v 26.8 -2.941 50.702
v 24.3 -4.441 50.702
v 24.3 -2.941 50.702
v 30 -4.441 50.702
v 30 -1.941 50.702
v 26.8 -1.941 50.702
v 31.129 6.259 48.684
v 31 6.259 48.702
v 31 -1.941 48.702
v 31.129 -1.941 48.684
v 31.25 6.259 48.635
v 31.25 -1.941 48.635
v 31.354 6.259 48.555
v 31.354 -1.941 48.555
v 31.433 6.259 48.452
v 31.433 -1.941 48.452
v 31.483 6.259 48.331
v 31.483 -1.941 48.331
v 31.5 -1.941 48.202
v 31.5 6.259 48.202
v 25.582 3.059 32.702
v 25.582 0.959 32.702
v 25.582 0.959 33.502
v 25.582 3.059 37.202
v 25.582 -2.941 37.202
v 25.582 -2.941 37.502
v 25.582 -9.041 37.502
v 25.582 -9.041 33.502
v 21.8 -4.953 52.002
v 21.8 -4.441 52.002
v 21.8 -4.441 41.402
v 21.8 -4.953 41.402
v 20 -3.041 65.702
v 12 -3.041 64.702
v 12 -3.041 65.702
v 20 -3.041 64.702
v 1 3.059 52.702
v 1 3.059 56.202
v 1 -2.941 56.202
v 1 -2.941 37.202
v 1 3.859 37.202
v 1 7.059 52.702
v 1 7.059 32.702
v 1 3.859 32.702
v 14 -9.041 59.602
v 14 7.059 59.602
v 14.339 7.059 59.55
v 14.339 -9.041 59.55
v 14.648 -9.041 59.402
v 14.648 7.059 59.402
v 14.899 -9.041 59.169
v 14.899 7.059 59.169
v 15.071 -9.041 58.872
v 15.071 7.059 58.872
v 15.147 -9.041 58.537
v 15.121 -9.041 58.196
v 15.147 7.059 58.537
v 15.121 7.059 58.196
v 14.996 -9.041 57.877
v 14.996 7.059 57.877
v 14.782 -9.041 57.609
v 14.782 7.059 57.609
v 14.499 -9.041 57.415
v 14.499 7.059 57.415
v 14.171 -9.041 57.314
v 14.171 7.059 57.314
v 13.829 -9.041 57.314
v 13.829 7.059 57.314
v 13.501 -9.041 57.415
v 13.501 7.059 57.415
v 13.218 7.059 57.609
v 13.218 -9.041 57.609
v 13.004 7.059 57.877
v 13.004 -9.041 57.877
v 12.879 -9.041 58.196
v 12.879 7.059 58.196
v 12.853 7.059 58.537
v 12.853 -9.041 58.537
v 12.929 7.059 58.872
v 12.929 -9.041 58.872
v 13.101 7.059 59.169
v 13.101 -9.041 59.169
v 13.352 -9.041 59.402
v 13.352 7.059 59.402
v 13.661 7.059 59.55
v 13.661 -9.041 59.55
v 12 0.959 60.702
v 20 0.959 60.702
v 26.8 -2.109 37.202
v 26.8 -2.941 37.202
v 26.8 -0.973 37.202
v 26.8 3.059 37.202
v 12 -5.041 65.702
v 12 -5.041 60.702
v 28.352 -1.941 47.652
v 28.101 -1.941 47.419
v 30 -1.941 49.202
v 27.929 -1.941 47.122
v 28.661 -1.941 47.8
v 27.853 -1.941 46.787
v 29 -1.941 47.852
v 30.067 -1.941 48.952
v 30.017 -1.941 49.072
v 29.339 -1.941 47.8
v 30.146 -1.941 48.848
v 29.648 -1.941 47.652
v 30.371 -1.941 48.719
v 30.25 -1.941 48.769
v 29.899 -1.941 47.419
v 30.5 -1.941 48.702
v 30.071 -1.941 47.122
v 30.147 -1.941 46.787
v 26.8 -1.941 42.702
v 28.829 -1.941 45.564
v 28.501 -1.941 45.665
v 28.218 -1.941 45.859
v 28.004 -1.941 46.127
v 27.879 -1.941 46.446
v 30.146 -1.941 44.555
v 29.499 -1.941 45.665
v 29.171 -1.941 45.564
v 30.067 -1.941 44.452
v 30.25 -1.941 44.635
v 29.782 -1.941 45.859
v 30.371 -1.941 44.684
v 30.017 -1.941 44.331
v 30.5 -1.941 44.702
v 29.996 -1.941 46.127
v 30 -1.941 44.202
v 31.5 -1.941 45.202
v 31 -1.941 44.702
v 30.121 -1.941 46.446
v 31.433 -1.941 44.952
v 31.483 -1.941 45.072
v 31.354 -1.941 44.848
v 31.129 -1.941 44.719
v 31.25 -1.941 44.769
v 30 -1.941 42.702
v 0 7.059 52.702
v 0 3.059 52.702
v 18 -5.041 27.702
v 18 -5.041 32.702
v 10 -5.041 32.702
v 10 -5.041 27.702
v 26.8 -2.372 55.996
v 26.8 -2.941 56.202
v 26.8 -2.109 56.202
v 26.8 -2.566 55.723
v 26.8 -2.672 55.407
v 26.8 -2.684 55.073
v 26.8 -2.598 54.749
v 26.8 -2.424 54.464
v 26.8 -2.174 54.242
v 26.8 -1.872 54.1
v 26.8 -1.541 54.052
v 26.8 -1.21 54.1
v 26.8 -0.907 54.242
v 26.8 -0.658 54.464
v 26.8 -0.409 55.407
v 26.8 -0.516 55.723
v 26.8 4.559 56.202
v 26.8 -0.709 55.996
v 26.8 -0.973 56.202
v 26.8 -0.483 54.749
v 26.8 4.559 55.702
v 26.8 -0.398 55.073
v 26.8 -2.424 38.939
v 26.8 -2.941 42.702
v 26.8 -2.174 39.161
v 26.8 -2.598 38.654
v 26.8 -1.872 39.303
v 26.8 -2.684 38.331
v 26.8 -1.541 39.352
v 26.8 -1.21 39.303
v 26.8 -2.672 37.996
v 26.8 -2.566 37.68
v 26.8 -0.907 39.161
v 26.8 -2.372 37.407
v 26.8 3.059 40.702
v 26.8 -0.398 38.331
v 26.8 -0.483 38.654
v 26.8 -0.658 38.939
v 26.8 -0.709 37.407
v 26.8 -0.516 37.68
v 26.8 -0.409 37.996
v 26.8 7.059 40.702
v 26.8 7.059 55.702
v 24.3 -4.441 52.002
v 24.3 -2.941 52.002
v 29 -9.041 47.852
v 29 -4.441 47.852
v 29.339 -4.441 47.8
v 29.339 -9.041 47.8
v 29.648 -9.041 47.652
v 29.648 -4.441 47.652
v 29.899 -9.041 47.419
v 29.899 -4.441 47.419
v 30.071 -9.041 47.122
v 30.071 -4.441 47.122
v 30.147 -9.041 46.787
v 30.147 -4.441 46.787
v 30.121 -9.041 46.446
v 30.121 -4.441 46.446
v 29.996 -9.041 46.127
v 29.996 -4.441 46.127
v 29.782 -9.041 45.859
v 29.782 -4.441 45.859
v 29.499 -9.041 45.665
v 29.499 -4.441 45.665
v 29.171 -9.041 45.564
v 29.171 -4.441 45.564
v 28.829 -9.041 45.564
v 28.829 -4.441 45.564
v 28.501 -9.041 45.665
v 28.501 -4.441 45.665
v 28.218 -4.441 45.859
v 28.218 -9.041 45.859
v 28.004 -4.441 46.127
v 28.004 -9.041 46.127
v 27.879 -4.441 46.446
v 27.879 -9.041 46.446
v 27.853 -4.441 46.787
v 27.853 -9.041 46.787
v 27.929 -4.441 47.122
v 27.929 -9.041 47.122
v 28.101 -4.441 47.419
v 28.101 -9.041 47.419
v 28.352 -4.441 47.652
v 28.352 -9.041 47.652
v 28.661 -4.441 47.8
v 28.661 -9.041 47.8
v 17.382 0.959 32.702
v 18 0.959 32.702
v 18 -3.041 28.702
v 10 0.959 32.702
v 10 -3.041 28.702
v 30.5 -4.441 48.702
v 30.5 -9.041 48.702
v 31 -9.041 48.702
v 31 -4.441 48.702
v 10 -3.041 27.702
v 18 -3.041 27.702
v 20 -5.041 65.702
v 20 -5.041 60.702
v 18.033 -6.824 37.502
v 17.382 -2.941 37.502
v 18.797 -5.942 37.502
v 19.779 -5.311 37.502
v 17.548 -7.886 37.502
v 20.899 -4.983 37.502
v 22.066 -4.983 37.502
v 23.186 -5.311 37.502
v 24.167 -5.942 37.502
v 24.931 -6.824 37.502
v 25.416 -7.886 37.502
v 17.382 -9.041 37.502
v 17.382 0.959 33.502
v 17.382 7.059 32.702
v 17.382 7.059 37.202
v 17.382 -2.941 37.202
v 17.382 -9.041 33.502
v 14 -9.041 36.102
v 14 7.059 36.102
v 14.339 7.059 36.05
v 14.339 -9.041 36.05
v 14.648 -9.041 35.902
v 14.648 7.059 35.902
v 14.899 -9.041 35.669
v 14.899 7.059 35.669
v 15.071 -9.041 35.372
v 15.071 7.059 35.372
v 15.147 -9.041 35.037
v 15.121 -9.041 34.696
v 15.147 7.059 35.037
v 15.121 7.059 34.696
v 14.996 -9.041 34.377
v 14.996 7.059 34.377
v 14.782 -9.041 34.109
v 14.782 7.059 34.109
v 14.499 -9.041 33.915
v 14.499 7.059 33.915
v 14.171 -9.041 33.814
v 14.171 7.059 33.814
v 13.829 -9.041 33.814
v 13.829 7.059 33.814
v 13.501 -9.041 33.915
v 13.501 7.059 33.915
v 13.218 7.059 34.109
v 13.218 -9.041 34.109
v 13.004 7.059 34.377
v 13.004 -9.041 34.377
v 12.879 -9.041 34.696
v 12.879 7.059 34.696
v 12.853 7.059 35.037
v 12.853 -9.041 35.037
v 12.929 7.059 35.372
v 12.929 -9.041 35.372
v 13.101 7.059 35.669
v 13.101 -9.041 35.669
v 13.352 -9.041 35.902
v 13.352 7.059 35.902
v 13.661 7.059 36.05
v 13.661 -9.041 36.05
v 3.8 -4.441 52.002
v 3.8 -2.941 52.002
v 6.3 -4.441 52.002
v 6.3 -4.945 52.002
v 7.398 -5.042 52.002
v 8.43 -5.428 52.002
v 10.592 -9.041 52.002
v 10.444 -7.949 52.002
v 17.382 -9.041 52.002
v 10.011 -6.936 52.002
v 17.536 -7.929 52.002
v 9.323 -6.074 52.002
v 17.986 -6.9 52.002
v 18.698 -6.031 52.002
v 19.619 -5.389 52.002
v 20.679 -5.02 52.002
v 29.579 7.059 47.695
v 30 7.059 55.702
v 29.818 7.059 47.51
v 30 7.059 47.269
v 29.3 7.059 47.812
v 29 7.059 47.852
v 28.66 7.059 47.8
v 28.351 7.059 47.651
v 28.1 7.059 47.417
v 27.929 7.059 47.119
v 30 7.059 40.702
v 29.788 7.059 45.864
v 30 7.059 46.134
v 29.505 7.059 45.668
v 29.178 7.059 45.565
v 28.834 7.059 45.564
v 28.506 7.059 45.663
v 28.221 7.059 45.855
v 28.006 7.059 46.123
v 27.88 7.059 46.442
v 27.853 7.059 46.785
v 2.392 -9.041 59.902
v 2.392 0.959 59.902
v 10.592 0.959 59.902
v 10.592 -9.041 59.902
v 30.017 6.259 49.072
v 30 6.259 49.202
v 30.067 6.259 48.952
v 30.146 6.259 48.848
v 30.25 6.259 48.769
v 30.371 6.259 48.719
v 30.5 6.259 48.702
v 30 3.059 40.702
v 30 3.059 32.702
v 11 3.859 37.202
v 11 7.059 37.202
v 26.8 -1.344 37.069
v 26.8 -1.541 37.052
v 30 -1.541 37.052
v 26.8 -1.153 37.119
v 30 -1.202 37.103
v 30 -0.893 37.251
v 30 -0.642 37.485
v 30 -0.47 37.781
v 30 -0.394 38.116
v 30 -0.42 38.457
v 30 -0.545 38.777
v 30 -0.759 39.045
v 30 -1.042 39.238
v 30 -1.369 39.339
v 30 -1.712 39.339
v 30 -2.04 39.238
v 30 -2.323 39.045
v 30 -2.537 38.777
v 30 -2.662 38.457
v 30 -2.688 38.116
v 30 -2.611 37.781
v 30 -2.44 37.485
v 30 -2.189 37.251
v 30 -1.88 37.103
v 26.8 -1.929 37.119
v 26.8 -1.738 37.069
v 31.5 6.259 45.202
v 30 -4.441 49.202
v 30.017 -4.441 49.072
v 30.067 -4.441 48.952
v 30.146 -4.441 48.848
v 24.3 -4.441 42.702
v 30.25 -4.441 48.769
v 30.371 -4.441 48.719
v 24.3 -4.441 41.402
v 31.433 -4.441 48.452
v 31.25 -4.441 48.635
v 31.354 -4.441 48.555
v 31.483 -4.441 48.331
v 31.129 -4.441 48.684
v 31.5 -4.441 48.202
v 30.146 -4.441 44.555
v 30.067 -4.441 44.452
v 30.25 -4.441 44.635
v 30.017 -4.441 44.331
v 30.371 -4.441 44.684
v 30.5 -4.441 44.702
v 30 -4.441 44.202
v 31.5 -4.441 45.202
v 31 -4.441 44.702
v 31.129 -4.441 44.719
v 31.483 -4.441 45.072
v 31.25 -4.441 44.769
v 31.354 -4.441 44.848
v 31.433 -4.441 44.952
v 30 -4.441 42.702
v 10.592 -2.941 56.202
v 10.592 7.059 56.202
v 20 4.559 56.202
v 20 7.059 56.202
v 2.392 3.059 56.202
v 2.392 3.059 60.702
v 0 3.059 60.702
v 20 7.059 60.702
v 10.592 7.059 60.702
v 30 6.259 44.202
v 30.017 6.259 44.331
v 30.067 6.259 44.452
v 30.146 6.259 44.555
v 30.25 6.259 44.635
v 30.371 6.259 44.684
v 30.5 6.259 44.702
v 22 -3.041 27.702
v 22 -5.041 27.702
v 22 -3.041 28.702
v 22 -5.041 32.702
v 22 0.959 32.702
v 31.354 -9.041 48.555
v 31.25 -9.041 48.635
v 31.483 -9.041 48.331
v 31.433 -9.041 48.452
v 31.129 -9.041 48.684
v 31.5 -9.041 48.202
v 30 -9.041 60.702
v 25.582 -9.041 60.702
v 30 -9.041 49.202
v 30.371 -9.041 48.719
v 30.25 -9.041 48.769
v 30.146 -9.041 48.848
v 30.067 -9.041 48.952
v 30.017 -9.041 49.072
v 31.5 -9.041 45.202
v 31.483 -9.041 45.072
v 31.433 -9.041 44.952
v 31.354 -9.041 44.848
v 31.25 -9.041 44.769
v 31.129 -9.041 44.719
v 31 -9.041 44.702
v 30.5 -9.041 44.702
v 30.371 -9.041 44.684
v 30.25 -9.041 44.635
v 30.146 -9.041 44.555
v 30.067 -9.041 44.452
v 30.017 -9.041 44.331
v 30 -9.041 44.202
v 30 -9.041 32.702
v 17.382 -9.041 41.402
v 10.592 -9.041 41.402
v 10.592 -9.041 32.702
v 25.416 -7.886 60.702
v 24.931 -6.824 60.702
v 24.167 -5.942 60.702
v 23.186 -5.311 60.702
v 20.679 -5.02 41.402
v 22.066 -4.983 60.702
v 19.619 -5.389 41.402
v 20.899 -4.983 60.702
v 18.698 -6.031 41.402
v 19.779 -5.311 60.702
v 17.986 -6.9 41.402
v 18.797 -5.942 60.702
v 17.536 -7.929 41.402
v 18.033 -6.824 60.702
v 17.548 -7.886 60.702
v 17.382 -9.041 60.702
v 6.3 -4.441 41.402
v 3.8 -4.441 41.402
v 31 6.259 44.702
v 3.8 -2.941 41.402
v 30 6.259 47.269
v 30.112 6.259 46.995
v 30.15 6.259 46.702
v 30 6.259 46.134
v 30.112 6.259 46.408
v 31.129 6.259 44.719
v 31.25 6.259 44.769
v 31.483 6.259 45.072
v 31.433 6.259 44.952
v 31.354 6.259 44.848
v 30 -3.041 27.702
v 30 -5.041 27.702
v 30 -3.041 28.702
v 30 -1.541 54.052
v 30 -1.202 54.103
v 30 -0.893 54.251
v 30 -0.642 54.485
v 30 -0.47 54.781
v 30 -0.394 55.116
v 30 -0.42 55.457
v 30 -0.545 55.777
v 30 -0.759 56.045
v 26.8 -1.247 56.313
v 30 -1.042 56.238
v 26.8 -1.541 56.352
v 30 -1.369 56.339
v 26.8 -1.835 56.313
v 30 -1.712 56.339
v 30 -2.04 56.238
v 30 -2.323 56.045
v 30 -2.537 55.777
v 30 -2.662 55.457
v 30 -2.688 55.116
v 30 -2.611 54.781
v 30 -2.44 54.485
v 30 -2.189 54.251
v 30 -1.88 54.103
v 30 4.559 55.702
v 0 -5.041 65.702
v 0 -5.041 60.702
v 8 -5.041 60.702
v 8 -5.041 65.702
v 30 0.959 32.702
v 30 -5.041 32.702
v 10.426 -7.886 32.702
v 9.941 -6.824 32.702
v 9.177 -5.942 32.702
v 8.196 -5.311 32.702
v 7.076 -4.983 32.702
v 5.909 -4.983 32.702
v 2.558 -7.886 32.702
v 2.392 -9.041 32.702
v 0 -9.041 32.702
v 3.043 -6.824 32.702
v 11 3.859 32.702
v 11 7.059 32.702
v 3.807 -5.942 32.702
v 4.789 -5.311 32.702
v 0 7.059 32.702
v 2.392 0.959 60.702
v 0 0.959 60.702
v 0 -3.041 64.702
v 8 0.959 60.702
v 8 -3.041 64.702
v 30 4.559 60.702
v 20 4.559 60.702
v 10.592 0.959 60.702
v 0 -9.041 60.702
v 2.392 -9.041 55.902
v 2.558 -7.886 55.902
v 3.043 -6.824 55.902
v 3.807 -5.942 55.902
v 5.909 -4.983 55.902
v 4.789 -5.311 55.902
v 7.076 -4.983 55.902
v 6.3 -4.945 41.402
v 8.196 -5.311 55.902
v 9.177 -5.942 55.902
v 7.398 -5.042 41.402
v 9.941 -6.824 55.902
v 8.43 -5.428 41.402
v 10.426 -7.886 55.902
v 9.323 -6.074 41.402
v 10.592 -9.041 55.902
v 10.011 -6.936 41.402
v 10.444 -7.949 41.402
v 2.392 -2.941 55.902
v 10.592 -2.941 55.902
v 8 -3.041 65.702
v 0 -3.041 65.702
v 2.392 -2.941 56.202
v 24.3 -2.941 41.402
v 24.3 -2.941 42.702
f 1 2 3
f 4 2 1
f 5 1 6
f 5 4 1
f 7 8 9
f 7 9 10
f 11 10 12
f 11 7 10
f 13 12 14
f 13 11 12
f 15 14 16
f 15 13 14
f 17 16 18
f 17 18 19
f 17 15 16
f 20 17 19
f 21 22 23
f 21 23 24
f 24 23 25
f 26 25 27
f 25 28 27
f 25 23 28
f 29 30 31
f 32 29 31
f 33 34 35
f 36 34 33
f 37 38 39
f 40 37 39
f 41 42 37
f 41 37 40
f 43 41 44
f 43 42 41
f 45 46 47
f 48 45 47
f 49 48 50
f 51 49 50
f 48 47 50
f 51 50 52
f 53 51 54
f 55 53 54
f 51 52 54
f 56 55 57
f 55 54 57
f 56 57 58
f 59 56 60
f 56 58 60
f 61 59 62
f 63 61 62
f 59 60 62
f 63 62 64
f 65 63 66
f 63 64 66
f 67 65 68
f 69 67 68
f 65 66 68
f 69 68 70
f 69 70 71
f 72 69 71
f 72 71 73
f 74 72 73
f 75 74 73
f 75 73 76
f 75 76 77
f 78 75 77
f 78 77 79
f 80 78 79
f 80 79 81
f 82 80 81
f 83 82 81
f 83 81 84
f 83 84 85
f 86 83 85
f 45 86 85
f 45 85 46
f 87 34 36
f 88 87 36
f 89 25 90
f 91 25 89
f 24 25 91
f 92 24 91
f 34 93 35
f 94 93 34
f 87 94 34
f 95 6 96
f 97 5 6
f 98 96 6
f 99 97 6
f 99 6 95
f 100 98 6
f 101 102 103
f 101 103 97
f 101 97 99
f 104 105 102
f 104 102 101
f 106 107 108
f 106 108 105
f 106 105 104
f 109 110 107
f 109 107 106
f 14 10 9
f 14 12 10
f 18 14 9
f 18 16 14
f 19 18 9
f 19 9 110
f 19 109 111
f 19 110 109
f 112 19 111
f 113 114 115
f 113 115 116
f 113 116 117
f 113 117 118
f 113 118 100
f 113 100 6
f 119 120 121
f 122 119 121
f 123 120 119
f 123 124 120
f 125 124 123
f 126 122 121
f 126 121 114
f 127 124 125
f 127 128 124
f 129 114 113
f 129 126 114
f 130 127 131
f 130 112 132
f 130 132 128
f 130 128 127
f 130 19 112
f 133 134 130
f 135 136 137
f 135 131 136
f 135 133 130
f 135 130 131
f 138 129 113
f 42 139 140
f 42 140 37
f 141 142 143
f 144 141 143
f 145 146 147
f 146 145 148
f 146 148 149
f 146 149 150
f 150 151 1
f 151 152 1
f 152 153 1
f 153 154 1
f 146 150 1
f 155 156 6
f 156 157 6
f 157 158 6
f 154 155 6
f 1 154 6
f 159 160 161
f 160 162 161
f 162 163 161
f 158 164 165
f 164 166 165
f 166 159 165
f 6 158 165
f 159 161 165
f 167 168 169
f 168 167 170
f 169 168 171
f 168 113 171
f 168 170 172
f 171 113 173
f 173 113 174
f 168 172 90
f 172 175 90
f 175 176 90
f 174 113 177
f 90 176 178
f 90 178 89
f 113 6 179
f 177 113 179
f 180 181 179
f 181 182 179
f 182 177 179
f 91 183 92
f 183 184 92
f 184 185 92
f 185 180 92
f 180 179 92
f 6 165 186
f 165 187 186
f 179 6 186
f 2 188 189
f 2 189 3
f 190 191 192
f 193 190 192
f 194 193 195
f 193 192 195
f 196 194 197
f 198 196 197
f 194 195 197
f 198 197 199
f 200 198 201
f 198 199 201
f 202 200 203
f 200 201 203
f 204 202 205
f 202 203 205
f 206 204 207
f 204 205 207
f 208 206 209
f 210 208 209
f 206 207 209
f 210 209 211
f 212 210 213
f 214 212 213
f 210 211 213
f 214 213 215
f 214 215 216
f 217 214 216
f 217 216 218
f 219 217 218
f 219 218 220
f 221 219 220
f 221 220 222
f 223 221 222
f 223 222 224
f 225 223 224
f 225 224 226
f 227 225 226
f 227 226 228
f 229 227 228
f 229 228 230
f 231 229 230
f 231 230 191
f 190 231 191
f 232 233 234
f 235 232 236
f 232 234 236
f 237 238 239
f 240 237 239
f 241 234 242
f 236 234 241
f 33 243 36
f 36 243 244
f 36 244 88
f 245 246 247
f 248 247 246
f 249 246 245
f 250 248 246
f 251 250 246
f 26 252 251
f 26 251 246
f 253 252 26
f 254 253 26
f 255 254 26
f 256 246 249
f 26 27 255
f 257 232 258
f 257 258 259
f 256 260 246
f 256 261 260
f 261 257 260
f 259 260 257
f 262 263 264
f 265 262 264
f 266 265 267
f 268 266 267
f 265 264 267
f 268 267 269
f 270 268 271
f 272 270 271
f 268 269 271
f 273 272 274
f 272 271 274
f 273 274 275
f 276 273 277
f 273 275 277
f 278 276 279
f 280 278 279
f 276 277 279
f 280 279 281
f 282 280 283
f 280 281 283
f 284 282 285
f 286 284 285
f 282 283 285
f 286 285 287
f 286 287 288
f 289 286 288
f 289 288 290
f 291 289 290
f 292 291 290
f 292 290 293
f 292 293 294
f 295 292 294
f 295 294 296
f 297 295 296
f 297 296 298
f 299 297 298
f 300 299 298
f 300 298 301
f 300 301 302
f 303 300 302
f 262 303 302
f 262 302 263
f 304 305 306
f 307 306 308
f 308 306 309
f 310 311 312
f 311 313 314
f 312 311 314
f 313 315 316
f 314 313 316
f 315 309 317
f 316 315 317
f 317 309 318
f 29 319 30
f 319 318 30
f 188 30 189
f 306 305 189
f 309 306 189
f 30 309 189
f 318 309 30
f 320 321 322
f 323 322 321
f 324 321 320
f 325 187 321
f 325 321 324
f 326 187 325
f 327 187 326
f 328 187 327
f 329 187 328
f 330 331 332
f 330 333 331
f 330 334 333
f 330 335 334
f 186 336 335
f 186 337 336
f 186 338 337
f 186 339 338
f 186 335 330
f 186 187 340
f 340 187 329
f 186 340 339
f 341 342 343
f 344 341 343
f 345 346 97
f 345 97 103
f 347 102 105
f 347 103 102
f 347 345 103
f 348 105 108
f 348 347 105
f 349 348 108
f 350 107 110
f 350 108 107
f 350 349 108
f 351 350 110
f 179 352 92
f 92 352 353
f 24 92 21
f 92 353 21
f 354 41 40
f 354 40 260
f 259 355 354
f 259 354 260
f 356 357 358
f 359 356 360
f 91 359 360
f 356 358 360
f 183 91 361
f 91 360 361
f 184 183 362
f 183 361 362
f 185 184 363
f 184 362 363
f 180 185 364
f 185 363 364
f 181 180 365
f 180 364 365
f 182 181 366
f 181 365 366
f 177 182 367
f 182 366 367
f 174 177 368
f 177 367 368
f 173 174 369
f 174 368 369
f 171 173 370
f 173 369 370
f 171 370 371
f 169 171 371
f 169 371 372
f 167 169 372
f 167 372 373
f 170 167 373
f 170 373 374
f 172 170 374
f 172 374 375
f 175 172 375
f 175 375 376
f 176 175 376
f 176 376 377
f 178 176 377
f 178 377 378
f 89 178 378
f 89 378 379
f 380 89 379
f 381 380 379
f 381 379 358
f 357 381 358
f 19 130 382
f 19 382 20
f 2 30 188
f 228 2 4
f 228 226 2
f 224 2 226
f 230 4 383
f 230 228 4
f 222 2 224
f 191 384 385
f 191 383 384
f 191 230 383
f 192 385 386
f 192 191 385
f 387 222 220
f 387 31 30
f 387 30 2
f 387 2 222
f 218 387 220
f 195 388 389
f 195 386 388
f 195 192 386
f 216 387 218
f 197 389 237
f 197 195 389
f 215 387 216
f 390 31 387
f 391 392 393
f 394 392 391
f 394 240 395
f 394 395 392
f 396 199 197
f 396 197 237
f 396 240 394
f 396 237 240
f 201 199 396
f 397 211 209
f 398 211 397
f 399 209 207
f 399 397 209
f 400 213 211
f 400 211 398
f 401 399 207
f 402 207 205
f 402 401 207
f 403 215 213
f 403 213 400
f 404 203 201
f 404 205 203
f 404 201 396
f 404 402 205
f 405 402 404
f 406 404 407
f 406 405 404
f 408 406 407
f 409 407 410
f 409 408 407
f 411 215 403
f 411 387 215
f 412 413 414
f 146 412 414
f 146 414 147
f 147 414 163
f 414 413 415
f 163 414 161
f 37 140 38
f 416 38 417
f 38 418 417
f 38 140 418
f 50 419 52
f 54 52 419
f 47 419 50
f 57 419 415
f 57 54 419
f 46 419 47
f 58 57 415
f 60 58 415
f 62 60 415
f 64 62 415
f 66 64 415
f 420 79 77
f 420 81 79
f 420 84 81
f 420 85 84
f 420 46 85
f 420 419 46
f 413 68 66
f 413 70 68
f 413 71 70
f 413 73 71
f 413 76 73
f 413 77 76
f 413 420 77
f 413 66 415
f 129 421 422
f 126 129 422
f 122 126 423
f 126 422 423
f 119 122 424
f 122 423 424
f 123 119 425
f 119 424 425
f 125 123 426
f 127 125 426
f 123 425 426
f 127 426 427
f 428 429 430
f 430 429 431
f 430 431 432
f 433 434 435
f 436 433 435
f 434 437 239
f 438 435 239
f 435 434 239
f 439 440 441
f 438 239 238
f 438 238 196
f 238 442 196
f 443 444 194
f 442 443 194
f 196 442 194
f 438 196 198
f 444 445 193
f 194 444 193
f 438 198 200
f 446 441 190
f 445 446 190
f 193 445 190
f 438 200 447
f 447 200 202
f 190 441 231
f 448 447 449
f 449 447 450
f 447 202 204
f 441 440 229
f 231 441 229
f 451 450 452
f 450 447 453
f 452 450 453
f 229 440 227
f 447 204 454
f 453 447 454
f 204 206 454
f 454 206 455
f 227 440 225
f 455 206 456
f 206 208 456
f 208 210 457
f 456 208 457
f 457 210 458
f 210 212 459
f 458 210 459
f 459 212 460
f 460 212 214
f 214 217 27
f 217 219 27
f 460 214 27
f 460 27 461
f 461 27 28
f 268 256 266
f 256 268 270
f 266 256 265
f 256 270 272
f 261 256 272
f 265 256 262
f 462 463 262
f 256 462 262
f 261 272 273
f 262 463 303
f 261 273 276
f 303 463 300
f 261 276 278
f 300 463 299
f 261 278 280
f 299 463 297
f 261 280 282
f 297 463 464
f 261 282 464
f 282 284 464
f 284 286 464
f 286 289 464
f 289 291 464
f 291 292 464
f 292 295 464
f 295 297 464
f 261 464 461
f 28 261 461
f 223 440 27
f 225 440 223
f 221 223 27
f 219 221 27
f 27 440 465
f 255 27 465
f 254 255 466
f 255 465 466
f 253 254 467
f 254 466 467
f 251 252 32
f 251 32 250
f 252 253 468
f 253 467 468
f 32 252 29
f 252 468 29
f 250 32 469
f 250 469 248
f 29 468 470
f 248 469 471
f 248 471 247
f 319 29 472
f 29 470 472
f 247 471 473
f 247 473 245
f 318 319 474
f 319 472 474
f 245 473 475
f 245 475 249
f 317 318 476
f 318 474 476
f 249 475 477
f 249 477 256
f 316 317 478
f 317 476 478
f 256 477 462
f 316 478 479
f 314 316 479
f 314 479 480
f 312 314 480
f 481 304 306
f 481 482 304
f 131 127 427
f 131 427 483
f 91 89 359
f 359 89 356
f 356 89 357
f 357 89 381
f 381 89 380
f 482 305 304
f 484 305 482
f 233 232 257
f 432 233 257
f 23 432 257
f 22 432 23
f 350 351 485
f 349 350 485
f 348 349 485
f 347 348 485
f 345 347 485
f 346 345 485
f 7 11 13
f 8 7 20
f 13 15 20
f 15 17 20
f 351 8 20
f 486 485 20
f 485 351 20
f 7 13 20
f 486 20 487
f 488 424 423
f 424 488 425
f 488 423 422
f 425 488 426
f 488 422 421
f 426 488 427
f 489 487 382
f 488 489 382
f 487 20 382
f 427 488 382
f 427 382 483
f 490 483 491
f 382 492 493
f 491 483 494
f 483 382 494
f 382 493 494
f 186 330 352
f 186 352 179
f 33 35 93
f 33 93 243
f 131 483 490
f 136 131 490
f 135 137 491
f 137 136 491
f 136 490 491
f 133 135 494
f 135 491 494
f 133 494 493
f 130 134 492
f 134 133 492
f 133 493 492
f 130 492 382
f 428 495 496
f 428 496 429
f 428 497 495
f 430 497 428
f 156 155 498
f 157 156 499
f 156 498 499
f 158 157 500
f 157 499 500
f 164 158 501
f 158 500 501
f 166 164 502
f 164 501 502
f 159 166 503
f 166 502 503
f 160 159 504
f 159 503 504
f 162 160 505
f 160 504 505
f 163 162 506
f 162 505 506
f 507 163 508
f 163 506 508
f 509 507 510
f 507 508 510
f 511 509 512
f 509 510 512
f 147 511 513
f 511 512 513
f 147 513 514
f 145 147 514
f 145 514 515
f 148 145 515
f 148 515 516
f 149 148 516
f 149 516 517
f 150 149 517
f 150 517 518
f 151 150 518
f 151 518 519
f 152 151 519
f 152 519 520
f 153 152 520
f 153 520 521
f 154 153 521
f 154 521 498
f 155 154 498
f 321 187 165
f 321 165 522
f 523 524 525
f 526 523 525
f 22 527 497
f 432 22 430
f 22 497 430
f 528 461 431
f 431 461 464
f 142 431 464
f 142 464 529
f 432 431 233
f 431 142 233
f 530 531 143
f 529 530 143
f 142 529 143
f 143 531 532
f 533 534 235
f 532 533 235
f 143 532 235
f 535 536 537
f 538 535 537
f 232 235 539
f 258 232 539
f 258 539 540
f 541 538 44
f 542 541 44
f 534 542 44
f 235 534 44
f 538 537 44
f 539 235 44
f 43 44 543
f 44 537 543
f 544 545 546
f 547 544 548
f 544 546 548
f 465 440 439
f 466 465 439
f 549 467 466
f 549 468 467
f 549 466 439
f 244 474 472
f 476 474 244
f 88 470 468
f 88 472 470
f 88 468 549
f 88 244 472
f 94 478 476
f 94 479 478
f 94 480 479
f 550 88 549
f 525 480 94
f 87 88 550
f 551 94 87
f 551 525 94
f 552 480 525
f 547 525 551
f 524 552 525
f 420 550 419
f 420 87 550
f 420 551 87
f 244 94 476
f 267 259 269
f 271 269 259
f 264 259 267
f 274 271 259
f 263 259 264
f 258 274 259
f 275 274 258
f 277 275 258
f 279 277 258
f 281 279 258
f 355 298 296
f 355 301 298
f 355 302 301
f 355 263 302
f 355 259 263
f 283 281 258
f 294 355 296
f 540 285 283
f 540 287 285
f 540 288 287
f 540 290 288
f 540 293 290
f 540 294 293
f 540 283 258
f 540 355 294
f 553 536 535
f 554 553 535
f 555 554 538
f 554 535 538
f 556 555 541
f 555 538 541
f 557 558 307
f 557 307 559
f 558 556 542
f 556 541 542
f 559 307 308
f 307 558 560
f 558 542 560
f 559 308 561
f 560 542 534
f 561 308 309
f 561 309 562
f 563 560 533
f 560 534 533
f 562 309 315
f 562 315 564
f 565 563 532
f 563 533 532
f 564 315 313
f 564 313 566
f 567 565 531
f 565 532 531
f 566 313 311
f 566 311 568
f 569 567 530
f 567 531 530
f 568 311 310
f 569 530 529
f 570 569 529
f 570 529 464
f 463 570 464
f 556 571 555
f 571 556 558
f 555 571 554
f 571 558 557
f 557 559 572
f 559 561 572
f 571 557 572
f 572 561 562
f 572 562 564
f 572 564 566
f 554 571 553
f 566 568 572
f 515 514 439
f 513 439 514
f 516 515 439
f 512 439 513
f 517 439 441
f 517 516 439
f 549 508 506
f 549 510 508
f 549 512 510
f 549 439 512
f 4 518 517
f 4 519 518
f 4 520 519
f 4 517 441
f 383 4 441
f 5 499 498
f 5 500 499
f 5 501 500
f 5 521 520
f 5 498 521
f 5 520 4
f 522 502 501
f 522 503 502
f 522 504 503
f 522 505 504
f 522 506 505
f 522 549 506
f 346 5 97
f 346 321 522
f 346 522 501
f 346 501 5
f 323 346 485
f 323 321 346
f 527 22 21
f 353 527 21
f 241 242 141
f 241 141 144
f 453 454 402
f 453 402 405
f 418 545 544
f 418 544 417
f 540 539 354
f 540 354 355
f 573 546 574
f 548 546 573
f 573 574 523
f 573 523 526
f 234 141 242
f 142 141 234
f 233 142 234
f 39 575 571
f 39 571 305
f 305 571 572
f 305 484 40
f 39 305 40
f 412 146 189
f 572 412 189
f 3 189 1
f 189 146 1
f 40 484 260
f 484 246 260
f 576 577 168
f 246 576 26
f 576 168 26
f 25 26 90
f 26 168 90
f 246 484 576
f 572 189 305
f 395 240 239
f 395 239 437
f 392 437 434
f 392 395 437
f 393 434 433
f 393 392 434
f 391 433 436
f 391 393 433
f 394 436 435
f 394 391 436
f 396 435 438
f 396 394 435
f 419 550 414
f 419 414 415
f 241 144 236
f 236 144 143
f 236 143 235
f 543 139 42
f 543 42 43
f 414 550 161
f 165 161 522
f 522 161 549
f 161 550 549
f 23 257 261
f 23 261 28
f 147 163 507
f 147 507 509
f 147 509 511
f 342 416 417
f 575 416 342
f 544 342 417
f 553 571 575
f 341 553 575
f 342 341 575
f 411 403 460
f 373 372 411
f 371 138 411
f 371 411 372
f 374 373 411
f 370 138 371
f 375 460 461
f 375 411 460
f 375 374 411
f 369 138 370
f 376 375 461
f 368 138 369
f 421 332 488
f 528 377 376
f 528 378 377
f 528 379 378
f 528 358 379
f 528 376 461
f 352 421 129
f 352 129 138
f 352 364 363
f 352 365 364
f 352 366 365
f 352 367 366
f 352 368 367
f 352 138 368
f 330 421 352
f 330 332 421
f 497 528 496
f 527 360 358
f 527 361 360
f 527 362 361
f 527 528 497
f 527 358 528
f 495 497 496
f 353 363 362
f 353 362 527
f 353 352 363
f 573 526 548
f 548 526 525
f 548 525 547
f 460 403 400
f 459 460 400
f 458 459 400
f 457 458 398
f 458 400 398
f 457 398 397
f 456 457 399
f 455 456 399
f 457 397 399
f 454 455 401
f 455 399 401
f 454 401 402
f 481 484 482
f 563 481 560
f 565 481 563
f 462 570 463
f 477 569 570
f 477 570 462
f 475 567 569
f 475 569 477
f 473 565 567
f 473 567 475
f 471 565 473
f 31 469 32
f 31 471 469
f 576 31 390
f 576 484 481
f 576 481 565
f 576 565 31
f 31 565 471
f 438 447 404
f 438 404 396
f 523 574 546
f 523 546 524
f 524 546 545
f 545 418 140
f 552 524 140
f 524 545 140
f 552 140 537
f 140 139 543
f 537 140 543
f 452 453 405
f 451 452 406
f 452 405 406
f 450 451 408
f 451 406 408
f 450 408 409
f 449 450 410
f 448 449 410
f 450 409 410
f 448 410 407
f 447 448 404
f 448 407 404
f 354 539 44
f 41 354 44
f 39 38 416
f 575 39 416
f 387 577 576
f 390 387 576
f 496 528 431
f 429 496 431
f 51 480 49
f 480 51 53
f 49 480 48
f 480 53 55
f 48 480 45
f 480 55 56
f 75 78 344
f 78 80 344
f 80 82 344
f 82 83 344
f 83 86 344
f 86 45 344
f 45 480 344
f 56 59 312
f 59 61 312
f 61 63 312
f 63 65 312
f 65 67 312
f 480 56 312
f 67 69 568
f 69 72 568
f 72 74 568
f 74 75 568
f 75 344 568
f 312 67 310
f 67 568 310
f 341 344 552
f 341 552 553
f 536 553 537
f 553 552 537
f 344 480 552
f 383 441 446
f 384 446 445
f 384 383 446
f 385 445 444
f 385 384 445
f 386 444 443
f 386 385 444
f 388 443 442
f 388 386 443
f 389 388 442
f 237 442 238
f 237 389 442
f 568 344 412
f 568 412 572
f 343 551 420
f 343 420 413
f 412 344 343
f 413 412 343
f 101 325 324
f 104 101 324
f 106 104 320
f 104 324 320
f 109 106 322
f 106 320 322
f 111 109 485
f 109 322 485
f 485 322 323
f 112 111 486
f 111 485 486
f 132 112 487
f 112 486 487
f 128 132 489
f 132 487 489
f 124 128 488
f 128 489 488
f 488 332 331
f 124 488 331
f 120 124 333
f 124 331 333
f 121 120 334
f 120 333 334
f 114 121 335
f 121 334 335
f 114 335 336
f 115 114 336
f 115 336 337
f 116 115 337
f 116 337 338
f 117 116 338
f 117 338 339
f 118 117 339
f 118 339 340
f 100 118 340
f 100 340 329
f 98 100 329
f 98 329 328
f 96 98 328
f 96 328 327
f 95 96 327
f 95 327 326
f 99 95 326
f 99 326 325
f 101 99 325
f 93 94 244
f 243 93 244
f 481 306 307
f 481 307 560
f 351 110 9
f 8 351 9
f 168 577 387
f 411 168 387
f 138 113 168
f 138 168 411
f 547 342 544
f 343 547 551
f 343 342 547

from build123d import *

# Parameters (mm, degrees)
SKETCH1_W           = 28
SKETCH1_H           = 16.1
BOSS_EXTRUDE1_DEPTH = 30
SKETCH2_W           = 10
SKETCH2_H           = 2.5
CUT_EXTRUDE1_DEPTH  = 5
SKETCH3_W           = 10
SKETCH3_H           = 4
CUT_EXTRUDE2_DEPTH  = 8
SKETCH4_W           = 10
SKETCH4_H           = 3.2
CUT_EXTRUDE3_DEPTH  = 8
SKETCH5_W           = 11
SKETCH5_H           = 4
CUT_EXTRUDE4_DEPTH  = 8
SKETCH6_W           = 20
SKETCH6_H           = 2
BOSS_EXTRUDE2_DEPTH = 5
CHAMFER1_SIZE       = 4
SKETCH7_W           = 20
SKETCH7_H           = 2
BOSS_EXTRUDE3_DEPTH = 5
CHAMFER2_SIZE       = 4
SKETCH9_W           = 25.8
SKETCH9_H           = 19
CUT_EXTRUDE6_DEPTH  = 10
SKETCH13_R          = 4.1
CUT_EXTRUDE10_DEPTH = 27.2
SKETCH14_R          = 4.1
CUT_EXTRUDE11_DEPTH = 27.2
SKETCH15_W          = 8.2
SKETCH15_H          = 4
CUT_EXTRUDE12_DEPTH = 27.2
SKETCH16_W          = 0.59230819
SKETCH16_H          = 0.8
SKETCH16_W_2        = 1.617695922
CUT_EXTRUDE13_DEPTH = 4
SKETCH17_W          = 1.5
SKETCH17_H          = 4
BOSS_EXTRUDE4_DEPTH = 16.1
FILLET1_R           = 0.5
SKETCH18_R          = 3.5
CUT_EXTRUDE14_DEPTH = 6.1
SKETCH19_W          = 8
SKETCH19_H          = 1
CUT_EXTRUDE15_DEPTH = 10
SKETCH20_W          = 20.5
SKETCH20_H          = 10.6
CUT_EXTRUDE16_DEPTH = 1.5
SKETCH21_W          = 5.7
SKETCH21_H          = 8
CUT_EXTRUDE17_DEPTH = 1.5
SKETCH22_W          = 8
SKETCH22_H          = 2.5
CUT_EXTRUDE18_DEPTH = 1.5
SKETCH23_R          = 1.15
CUT_EXTRUDE19_DEPTH = 75.620049118
SKETCH24_W          = 8.2
SKETCH24_H          = 0.8
CUT_EXTRUDE20_DEPTH = 2.1
CUT_EXTRUDE21_REACH = 75.421
SKETCH25_W          = 7.929527271
SKETCH25_H          = 0.8
CUT_EXTRUDE22_START = -5
SKETCH26_W          = 4
SKETCH26_H          = 6
CUT_EXTRUDE22_DEPTH = 5
CUT_EXTRUDE23_START = -5
SKETCH27_W          = 4
SKETCH27_H          = 6
CUT_EXTRUDE23_DEPTH = 5
SKETCH28_R          = 1.15
CUT_EXTRUDE24_DEPTH = 3.2
CUT_EXTRUDE25_REACH = 75.764
SKETCH29_W          = 15.5
SKETCH29_H          = 10.6


with BuildPart() as part:
    # Sketch1 → Boss-Extrude1 (new body)
    with BuildSketch(Plane(origin=(0, 0, 0), x_dir=(0, 0, -1), z_dir=(1, 0, 0))):
        with Locations((-46.701535197, -0.990821865)):
            Rectangle(SKETCH1_W, SKETCH1_H)
    extrude(amount=BOSS_EXTRUDE1_DEPTH)

    # Sketch2 → Cut-Extrude1 (cut)
    with BuildSketch(Plane.XY.offset(60.701535197)):
        with Locations((25, 5.809178135)):
            Rectangle(SKETCH2_W, SKETCH2_H)
    extrude(amount=-CUT_EXTRUDE1_DEPTH, mode=Mode.SUBTRACT)

    # Sketch3 → Cut-Extrude2 (cut)
    with BuildSketch(Plane.XY.offset(60.701535197)):
        with Locations((5, 5.059178135)):
            Rectangle(SKETCH3_W, SKETCH3_H)
    extrude(amount=-CUT_EXTRUDE2_DEPTH, mode=Mode.SUBTRACT)

    # Sketch4 → Cut-Extrude3 (cut)
    with BuildSketch(Plane(origin=(0, 0, 32.701535197), x_dir=(-1, 0, 0), z_dir=(0, 0, -1))):
        with Locations((-6, 5.459178135)):
            Rectangle(SKETCH4_W, SKETCH4_H)
    extrude(amount=-CUT_EXTRUDE3_DEPTH, mode=Mode.SUBTRACT)

    # Sketch5 → Cut-Extrude4 (cut)
    with BuildSketch(Plane(origin=(0, 0, 32.701535197), x_dir=(-1, 0, 0), z_dir=(0, 0, -1))):
        with Locations((-24.5, 5.059178135)):
            Rectangle(SKETCH5_W, SKETCH5_H)
    extrude(amount=-CUT_EXTRUDE4_DEPTH, mode=Mode.SUBTRACT)

    # Sketch6 → Boss-Extrude2 (add)
    with BuildSketch(Plane(origin=(0, 0, 32.701535197), x_dir=(-1, 0, 0), z_dir=(0, 0, -1))):
        with Locations((-20, -4.040821865)):
            Rectangle(SKETCH6_W, SKETCH6_H)
    extrude(amount=BOSS_EXTRUDE2_DEPTH)

    # Chamfer1
    chamfer1_edges = [part.edges().sort_by_distance(p)[0] for p in [
        (20, -3.040821865, 32.701535197),
    ]]
    chamfer(chamfer1_edges, length=CHAMFER1_SIZE)

    # Sketch7 → Boss-Extrude3 (add)
    with BuildSketch(Plane.XY.offset(60.701535197)):
        with Locations((10, -4.040821865)):
            Rectangle(SKETCH7_W, SKETCH7_H)
    extrude(amount=BOSS_EXTRUDE3_DEPTH)

    # Chamfer2
    chamfer2_edges = [part.edges().sort_by_distance(p)[0] for p in [
        (10, -3.040821865, 60.701535197),
    ]]
    chamfer(chamfer2_edges, length=CHAMFER2_SIZE)

    # Sketch9 → Cut-Extrude6 (cut)
    with BuildSketch(Plane(origin=(0, 7.059178135, 0), x_dir=(1, 0, 0), z_dir=(0, 1, 0))):
        with Locations((13.9, -46.701535197)):
            Rectangle(SKETCH9_W, SKETCH9_H)
    extrude(amount=-CUT_EXTRUDE6_DEPTH, mode=Mode.SUBTRACT)

    # Sketch13 → Cut-Extrude10 (cut)
    with BuildSketch(Plane.XY.offset(60.701535197)):
        with Locations((21.482304078, -9.040821865)):
            Circle(SKETCH13_R)
    extrude(amount=-CUT_EXTRUDE10_DEPTH, mode=Mode.SUBTRACT)

    # Sketch14 → Cut-Extrude11 (cut)
    with BuildSketch(Plane(origin=(0, 0, 32.701535197), x_dir=(-1, 0, 0), z_dir=(0, 0, -1))):
        with Locations((-6.49230819, -9.040821865)):
            Circle(SKETCH14_R)
    extrude(amount=-CUT_EXTRUDE11_DEPTH, mode=Mode.SUBTRACT)

    # Sketch15 → Cut-Extrude12 (cut)
    with BuildSketch(Plane.XZ.offset(9.040821865)):
        with Locations((6.49230819, 57.901535197)):
            Rectangle(SKETCH15_W, SKETCH15_H)
        with Locations((21.482304078, 35.501535197)):
            Rectangle(SKETCH15_W, SKETCH15_H)
    extrude(amount=-CUT_EXTRUDE12_DEPTH, mode=Mode.SUBTRACT)

    # Sketch16 → Cut-Extrude13 (cut)
    with BuildSketch(Plane(origin=(0, 7.059178135, 0), x_dir=(1, 0, 0), z_dir=(0, 1, 0))):
        with Locations((10.296154095, -60.301535197)):
            Rectangle(SKETCH16_W, SKETCH16_H)
        with Locations((18.191152039, -33.101535197)):
            Rectangle(SKETCH16_W_2, SKETCH16_H)
    extrude(amount=-CUT_EXTRUDE13_DEPTH, mode=Mode.SUBTRACT)

    # Sketch17 → Boss-Extrude4 (add)
    with BuildSketch(Plane.XZ.offset(9.040821865)):
        with Locations((30.75, 46.701535197)):
            Rectangle(SKETCH17_W, SKETCH17_H)
    extrude(amount=-BOSS_EXTRUDE4_DEPTH)

    # Fillet1
    fillet1_edges = [part.edges().sort_by_distance(p)[0] for p in [
        (30, -0.990821865, 44.701535197),
        (30, -0.990821865, 48.701535197),
        (31.5, -0.990821865, 48.701535197),
        (31.5, -0.990821865, 44.701535197),
    ]]
    fillet(fillet1_edges, radius=FILLET1_R)

    # Sketch18 → Cut-Extrude14 (cut)
    with BuildSketch(Plane.XZ.offset(9.040821865)):
        with Locations(Location((13.985, 46.701535197, 0), (0, 0, 194.224464848))):
            Circle(SKETCH18_R)
    extrude(amount=-CUT_EXTRUDE14_DEPTH, mode=Mode.SUBTRACT)

    # Sketch19 → Cut-Extrude15 (cut)
    with BuildSketch(Plane(origin=(31.5, 0, 0), x_dir=(0, 0, -1), z_dir=(1, 0, 0))):
        with Locations((-46.701535197, -2.440821865)):
            Rectangle(SKETCH19_W, SKETCH19_H)
    extrude(amount=-CUT_EXTRUDE15_DEPTH, mode=Mode.SUBTRACT)

    # Sketch20 → Cut-Extrude16 (cut)
    with BuildSketch(Plane(origin=(0, -2.940821865, 0), x_dir=(1, 0, 0), z_dir=(0, 1, 0))):
        with Locations((14.05, -46.701535197)):
            Rectangle(SKETCH20_W, SKETCH20_H)
    extrude(amount=-CUT_EXTRUDE16_DEPTH, mode=Mode.SUBTRACT)

    # Sketch21 → Cut-Extrude17 (cut)
    with BuildSketch(Plane(origin=(0, -2.940821865, 0), x_dir=(1, 0, 0), z_dir=(0, 1, 0))):
        with Locations((27.15, -46.701535197)):
            Rectangle(SKETCH21_W, SKETCH21_H)
    extrude(amount=-CUT_EXTRUDE17_DEPTH, mode=Mode.SUBTRACT)

    # Sketch22 → Cut-Extrude18 (cut)
    with BuildSketch(Plane(origin=(31.5, 0, 0), x_dir=(0, 0, -1), z_dir=(1, 0, 0))):
        with Locations((-46.701535197, -3.190821865)):
            Rectangle(SKETCH22_W, SKETCH22_H)
    extrude(amount=-CUT_EXTRUDE18_DEPTH, mode=Mode.SUBTRACT)

    # Sketch23 → Cut-Extrude19 (cut, through all)
    with BuildSketch(Plane(origin=(0, 7.059178135, 0), x_dir=(1, 0, 0), z_dir=(0, 1, 0))):
        with Locations(Location((29, -46.701535197, 0), (0, 0, 270))):
            Circle(SKETCH23_R)
        with Locations(Location((14, -34.951535197, 0), (0, 0, 270))):
            Circle(SKETCH23_R)
        with Locations(Location((14, -58.451535197, 0), (0, 0, 270))):
            Circle(SKETCH23_R)
    extrude(amount=-CUT_EXTRUDE19_DEPTH, mode=Mode.SUBTRACT)

    # Sketch24 → Cut-Extrude20 (cut)
    with BuildSketch(Plane(origin=(0, 3.059178135, 0), x_dir=(1, 0, 0), z_dir=(0, 1, 0))):
        with Locations((21.482304078, -33.101535197)):
            Rectangle(SKETCH24_W, SKETCH24_H)
        with Locations((6.49230819, -60.301535197)):
            Rectangle(SKETCH24_W, SKETCH24_H)
    extrude(amount=-CUT_EXTRUDE20_DEPTH, mode=Mode.SUBTRACT)

    # Cut-Extrude21: up to this face of the body (flat: up to its plane)
    cut_extrude21_end = Plane(part.part.faces().sort_by_distance((30, -1.445232759, 54.822020691))[0])
    # Sketch25 → Cut-Extrude21 (cut, up to the picked face)
    with BuildSketch(Plane(origin=(31.5, 0, 0), x_dir=(0, 0, -1), z_dir=(1, 0, 0)), mode=Mode.PRIVATE) as cut_extrude21_sk1:
        with Locations((-46.553400254, 6.659178135)):
            Rectangle(SKETCH25_W, SKETCH25_H)
    cut_extrude21_tool1 = split(extrude(cut_extrude21_sk1.sketch, amount=-CUT_EXTRUDE21_REACH, mode=Mode.PRIVATE), bisect_by=cut_extrude21_end, keep=Keep.BOTH, mode=Mode.PRIVATE)
    add(cut_extrude21_tool1.solids().sort_by(Axis((31.5, 6.659178, 46.5534), (-1, 0, 0)))[0], mode=Mode.SUBTRACT)

    # Sketch26 → Cut-Extrude22 (cut)
    with BuildSketch(Plane.XY.offset(65.701535197).offset(CUT_EXTRUDE22_START)):
        with Locations((10, -2.040821865)):
            Rectangle(SKETCH26_W, SKETCH26_H)
    extrude(amount=CUT_EXTRUDE22_DEPTH, mode=Mode.SUBTRACT)

    # Sketch27 → Cut-Extrude23 (cut)
    with BuildSketch(Plane(origin=(0, 0, 27.701535197), x_dir=(-1, 0, 0), z_dir=(0, 0, -1)).offset(CUT_EXTRUDE23_START)):
        with Locations((-20, -2.040821865)):
            Rectangle(SKETCH27_W, SKETCH27_H)
    extrude(amount=CUT_EXTRUDE23_DEPTH, mode=Mode.SUBTRACT)

    # Sketch28 → Cut-Extrude24 (cut)
    with BuildSketch(Plane(origin=(30, 0, 0), x_dir=(0, 0, -1), z_dir=(1, 0, 0))):
        with Locations((-55.201535197, -1.540821865)):
            Circle(SKETCH28_R)
        with Locations((-38.201535197, -1.540821865)):
            Circle(SKETCH28_R)
    extrude(amount=-CUT_EXTRUDE24_DEPTH, mode=Mode.SUBTRACT)

    # Cut-Extrude25: up to this face of the body (flat: up to its plane)
    cut_extrude25_end = Plane(part.part.faces().sort_by_distance((10.921875254, -9.040821865, 51.731547487))[0])
    # Sketch29 → Cut-Extrude25 (cut, up to the picked face)
    with BuildSketch(Plane(origin=(0, -4.440821865, 0), x_dir=(1, 0, 0), z_dir=(0, 1, 0)), mode=Mode.PRIVATE) as cut_extrude25_sk1:
        with Locations((14.05, -46.701535197)):
            Rectangle(SKETCH29_W, SKETCH29_H)
    cut_extrude25_tool1 = split(extrude(cut_extrude25_sk1.sketch, amount=-CUT_EXTRUDE25_REACH, mode=Mode.PRIVATE), bisect_by=cut_extrude25_end, keep=Keep.BOTH, mode=Mode.PRIVATE)
    add(cut_extrude25_tool1.solids().sort_by(Axis((14.05, -4.440822, 46.701535), (0, -1, 0)))[0], mode=Mode.SUBTRACT)


solid = part.part
